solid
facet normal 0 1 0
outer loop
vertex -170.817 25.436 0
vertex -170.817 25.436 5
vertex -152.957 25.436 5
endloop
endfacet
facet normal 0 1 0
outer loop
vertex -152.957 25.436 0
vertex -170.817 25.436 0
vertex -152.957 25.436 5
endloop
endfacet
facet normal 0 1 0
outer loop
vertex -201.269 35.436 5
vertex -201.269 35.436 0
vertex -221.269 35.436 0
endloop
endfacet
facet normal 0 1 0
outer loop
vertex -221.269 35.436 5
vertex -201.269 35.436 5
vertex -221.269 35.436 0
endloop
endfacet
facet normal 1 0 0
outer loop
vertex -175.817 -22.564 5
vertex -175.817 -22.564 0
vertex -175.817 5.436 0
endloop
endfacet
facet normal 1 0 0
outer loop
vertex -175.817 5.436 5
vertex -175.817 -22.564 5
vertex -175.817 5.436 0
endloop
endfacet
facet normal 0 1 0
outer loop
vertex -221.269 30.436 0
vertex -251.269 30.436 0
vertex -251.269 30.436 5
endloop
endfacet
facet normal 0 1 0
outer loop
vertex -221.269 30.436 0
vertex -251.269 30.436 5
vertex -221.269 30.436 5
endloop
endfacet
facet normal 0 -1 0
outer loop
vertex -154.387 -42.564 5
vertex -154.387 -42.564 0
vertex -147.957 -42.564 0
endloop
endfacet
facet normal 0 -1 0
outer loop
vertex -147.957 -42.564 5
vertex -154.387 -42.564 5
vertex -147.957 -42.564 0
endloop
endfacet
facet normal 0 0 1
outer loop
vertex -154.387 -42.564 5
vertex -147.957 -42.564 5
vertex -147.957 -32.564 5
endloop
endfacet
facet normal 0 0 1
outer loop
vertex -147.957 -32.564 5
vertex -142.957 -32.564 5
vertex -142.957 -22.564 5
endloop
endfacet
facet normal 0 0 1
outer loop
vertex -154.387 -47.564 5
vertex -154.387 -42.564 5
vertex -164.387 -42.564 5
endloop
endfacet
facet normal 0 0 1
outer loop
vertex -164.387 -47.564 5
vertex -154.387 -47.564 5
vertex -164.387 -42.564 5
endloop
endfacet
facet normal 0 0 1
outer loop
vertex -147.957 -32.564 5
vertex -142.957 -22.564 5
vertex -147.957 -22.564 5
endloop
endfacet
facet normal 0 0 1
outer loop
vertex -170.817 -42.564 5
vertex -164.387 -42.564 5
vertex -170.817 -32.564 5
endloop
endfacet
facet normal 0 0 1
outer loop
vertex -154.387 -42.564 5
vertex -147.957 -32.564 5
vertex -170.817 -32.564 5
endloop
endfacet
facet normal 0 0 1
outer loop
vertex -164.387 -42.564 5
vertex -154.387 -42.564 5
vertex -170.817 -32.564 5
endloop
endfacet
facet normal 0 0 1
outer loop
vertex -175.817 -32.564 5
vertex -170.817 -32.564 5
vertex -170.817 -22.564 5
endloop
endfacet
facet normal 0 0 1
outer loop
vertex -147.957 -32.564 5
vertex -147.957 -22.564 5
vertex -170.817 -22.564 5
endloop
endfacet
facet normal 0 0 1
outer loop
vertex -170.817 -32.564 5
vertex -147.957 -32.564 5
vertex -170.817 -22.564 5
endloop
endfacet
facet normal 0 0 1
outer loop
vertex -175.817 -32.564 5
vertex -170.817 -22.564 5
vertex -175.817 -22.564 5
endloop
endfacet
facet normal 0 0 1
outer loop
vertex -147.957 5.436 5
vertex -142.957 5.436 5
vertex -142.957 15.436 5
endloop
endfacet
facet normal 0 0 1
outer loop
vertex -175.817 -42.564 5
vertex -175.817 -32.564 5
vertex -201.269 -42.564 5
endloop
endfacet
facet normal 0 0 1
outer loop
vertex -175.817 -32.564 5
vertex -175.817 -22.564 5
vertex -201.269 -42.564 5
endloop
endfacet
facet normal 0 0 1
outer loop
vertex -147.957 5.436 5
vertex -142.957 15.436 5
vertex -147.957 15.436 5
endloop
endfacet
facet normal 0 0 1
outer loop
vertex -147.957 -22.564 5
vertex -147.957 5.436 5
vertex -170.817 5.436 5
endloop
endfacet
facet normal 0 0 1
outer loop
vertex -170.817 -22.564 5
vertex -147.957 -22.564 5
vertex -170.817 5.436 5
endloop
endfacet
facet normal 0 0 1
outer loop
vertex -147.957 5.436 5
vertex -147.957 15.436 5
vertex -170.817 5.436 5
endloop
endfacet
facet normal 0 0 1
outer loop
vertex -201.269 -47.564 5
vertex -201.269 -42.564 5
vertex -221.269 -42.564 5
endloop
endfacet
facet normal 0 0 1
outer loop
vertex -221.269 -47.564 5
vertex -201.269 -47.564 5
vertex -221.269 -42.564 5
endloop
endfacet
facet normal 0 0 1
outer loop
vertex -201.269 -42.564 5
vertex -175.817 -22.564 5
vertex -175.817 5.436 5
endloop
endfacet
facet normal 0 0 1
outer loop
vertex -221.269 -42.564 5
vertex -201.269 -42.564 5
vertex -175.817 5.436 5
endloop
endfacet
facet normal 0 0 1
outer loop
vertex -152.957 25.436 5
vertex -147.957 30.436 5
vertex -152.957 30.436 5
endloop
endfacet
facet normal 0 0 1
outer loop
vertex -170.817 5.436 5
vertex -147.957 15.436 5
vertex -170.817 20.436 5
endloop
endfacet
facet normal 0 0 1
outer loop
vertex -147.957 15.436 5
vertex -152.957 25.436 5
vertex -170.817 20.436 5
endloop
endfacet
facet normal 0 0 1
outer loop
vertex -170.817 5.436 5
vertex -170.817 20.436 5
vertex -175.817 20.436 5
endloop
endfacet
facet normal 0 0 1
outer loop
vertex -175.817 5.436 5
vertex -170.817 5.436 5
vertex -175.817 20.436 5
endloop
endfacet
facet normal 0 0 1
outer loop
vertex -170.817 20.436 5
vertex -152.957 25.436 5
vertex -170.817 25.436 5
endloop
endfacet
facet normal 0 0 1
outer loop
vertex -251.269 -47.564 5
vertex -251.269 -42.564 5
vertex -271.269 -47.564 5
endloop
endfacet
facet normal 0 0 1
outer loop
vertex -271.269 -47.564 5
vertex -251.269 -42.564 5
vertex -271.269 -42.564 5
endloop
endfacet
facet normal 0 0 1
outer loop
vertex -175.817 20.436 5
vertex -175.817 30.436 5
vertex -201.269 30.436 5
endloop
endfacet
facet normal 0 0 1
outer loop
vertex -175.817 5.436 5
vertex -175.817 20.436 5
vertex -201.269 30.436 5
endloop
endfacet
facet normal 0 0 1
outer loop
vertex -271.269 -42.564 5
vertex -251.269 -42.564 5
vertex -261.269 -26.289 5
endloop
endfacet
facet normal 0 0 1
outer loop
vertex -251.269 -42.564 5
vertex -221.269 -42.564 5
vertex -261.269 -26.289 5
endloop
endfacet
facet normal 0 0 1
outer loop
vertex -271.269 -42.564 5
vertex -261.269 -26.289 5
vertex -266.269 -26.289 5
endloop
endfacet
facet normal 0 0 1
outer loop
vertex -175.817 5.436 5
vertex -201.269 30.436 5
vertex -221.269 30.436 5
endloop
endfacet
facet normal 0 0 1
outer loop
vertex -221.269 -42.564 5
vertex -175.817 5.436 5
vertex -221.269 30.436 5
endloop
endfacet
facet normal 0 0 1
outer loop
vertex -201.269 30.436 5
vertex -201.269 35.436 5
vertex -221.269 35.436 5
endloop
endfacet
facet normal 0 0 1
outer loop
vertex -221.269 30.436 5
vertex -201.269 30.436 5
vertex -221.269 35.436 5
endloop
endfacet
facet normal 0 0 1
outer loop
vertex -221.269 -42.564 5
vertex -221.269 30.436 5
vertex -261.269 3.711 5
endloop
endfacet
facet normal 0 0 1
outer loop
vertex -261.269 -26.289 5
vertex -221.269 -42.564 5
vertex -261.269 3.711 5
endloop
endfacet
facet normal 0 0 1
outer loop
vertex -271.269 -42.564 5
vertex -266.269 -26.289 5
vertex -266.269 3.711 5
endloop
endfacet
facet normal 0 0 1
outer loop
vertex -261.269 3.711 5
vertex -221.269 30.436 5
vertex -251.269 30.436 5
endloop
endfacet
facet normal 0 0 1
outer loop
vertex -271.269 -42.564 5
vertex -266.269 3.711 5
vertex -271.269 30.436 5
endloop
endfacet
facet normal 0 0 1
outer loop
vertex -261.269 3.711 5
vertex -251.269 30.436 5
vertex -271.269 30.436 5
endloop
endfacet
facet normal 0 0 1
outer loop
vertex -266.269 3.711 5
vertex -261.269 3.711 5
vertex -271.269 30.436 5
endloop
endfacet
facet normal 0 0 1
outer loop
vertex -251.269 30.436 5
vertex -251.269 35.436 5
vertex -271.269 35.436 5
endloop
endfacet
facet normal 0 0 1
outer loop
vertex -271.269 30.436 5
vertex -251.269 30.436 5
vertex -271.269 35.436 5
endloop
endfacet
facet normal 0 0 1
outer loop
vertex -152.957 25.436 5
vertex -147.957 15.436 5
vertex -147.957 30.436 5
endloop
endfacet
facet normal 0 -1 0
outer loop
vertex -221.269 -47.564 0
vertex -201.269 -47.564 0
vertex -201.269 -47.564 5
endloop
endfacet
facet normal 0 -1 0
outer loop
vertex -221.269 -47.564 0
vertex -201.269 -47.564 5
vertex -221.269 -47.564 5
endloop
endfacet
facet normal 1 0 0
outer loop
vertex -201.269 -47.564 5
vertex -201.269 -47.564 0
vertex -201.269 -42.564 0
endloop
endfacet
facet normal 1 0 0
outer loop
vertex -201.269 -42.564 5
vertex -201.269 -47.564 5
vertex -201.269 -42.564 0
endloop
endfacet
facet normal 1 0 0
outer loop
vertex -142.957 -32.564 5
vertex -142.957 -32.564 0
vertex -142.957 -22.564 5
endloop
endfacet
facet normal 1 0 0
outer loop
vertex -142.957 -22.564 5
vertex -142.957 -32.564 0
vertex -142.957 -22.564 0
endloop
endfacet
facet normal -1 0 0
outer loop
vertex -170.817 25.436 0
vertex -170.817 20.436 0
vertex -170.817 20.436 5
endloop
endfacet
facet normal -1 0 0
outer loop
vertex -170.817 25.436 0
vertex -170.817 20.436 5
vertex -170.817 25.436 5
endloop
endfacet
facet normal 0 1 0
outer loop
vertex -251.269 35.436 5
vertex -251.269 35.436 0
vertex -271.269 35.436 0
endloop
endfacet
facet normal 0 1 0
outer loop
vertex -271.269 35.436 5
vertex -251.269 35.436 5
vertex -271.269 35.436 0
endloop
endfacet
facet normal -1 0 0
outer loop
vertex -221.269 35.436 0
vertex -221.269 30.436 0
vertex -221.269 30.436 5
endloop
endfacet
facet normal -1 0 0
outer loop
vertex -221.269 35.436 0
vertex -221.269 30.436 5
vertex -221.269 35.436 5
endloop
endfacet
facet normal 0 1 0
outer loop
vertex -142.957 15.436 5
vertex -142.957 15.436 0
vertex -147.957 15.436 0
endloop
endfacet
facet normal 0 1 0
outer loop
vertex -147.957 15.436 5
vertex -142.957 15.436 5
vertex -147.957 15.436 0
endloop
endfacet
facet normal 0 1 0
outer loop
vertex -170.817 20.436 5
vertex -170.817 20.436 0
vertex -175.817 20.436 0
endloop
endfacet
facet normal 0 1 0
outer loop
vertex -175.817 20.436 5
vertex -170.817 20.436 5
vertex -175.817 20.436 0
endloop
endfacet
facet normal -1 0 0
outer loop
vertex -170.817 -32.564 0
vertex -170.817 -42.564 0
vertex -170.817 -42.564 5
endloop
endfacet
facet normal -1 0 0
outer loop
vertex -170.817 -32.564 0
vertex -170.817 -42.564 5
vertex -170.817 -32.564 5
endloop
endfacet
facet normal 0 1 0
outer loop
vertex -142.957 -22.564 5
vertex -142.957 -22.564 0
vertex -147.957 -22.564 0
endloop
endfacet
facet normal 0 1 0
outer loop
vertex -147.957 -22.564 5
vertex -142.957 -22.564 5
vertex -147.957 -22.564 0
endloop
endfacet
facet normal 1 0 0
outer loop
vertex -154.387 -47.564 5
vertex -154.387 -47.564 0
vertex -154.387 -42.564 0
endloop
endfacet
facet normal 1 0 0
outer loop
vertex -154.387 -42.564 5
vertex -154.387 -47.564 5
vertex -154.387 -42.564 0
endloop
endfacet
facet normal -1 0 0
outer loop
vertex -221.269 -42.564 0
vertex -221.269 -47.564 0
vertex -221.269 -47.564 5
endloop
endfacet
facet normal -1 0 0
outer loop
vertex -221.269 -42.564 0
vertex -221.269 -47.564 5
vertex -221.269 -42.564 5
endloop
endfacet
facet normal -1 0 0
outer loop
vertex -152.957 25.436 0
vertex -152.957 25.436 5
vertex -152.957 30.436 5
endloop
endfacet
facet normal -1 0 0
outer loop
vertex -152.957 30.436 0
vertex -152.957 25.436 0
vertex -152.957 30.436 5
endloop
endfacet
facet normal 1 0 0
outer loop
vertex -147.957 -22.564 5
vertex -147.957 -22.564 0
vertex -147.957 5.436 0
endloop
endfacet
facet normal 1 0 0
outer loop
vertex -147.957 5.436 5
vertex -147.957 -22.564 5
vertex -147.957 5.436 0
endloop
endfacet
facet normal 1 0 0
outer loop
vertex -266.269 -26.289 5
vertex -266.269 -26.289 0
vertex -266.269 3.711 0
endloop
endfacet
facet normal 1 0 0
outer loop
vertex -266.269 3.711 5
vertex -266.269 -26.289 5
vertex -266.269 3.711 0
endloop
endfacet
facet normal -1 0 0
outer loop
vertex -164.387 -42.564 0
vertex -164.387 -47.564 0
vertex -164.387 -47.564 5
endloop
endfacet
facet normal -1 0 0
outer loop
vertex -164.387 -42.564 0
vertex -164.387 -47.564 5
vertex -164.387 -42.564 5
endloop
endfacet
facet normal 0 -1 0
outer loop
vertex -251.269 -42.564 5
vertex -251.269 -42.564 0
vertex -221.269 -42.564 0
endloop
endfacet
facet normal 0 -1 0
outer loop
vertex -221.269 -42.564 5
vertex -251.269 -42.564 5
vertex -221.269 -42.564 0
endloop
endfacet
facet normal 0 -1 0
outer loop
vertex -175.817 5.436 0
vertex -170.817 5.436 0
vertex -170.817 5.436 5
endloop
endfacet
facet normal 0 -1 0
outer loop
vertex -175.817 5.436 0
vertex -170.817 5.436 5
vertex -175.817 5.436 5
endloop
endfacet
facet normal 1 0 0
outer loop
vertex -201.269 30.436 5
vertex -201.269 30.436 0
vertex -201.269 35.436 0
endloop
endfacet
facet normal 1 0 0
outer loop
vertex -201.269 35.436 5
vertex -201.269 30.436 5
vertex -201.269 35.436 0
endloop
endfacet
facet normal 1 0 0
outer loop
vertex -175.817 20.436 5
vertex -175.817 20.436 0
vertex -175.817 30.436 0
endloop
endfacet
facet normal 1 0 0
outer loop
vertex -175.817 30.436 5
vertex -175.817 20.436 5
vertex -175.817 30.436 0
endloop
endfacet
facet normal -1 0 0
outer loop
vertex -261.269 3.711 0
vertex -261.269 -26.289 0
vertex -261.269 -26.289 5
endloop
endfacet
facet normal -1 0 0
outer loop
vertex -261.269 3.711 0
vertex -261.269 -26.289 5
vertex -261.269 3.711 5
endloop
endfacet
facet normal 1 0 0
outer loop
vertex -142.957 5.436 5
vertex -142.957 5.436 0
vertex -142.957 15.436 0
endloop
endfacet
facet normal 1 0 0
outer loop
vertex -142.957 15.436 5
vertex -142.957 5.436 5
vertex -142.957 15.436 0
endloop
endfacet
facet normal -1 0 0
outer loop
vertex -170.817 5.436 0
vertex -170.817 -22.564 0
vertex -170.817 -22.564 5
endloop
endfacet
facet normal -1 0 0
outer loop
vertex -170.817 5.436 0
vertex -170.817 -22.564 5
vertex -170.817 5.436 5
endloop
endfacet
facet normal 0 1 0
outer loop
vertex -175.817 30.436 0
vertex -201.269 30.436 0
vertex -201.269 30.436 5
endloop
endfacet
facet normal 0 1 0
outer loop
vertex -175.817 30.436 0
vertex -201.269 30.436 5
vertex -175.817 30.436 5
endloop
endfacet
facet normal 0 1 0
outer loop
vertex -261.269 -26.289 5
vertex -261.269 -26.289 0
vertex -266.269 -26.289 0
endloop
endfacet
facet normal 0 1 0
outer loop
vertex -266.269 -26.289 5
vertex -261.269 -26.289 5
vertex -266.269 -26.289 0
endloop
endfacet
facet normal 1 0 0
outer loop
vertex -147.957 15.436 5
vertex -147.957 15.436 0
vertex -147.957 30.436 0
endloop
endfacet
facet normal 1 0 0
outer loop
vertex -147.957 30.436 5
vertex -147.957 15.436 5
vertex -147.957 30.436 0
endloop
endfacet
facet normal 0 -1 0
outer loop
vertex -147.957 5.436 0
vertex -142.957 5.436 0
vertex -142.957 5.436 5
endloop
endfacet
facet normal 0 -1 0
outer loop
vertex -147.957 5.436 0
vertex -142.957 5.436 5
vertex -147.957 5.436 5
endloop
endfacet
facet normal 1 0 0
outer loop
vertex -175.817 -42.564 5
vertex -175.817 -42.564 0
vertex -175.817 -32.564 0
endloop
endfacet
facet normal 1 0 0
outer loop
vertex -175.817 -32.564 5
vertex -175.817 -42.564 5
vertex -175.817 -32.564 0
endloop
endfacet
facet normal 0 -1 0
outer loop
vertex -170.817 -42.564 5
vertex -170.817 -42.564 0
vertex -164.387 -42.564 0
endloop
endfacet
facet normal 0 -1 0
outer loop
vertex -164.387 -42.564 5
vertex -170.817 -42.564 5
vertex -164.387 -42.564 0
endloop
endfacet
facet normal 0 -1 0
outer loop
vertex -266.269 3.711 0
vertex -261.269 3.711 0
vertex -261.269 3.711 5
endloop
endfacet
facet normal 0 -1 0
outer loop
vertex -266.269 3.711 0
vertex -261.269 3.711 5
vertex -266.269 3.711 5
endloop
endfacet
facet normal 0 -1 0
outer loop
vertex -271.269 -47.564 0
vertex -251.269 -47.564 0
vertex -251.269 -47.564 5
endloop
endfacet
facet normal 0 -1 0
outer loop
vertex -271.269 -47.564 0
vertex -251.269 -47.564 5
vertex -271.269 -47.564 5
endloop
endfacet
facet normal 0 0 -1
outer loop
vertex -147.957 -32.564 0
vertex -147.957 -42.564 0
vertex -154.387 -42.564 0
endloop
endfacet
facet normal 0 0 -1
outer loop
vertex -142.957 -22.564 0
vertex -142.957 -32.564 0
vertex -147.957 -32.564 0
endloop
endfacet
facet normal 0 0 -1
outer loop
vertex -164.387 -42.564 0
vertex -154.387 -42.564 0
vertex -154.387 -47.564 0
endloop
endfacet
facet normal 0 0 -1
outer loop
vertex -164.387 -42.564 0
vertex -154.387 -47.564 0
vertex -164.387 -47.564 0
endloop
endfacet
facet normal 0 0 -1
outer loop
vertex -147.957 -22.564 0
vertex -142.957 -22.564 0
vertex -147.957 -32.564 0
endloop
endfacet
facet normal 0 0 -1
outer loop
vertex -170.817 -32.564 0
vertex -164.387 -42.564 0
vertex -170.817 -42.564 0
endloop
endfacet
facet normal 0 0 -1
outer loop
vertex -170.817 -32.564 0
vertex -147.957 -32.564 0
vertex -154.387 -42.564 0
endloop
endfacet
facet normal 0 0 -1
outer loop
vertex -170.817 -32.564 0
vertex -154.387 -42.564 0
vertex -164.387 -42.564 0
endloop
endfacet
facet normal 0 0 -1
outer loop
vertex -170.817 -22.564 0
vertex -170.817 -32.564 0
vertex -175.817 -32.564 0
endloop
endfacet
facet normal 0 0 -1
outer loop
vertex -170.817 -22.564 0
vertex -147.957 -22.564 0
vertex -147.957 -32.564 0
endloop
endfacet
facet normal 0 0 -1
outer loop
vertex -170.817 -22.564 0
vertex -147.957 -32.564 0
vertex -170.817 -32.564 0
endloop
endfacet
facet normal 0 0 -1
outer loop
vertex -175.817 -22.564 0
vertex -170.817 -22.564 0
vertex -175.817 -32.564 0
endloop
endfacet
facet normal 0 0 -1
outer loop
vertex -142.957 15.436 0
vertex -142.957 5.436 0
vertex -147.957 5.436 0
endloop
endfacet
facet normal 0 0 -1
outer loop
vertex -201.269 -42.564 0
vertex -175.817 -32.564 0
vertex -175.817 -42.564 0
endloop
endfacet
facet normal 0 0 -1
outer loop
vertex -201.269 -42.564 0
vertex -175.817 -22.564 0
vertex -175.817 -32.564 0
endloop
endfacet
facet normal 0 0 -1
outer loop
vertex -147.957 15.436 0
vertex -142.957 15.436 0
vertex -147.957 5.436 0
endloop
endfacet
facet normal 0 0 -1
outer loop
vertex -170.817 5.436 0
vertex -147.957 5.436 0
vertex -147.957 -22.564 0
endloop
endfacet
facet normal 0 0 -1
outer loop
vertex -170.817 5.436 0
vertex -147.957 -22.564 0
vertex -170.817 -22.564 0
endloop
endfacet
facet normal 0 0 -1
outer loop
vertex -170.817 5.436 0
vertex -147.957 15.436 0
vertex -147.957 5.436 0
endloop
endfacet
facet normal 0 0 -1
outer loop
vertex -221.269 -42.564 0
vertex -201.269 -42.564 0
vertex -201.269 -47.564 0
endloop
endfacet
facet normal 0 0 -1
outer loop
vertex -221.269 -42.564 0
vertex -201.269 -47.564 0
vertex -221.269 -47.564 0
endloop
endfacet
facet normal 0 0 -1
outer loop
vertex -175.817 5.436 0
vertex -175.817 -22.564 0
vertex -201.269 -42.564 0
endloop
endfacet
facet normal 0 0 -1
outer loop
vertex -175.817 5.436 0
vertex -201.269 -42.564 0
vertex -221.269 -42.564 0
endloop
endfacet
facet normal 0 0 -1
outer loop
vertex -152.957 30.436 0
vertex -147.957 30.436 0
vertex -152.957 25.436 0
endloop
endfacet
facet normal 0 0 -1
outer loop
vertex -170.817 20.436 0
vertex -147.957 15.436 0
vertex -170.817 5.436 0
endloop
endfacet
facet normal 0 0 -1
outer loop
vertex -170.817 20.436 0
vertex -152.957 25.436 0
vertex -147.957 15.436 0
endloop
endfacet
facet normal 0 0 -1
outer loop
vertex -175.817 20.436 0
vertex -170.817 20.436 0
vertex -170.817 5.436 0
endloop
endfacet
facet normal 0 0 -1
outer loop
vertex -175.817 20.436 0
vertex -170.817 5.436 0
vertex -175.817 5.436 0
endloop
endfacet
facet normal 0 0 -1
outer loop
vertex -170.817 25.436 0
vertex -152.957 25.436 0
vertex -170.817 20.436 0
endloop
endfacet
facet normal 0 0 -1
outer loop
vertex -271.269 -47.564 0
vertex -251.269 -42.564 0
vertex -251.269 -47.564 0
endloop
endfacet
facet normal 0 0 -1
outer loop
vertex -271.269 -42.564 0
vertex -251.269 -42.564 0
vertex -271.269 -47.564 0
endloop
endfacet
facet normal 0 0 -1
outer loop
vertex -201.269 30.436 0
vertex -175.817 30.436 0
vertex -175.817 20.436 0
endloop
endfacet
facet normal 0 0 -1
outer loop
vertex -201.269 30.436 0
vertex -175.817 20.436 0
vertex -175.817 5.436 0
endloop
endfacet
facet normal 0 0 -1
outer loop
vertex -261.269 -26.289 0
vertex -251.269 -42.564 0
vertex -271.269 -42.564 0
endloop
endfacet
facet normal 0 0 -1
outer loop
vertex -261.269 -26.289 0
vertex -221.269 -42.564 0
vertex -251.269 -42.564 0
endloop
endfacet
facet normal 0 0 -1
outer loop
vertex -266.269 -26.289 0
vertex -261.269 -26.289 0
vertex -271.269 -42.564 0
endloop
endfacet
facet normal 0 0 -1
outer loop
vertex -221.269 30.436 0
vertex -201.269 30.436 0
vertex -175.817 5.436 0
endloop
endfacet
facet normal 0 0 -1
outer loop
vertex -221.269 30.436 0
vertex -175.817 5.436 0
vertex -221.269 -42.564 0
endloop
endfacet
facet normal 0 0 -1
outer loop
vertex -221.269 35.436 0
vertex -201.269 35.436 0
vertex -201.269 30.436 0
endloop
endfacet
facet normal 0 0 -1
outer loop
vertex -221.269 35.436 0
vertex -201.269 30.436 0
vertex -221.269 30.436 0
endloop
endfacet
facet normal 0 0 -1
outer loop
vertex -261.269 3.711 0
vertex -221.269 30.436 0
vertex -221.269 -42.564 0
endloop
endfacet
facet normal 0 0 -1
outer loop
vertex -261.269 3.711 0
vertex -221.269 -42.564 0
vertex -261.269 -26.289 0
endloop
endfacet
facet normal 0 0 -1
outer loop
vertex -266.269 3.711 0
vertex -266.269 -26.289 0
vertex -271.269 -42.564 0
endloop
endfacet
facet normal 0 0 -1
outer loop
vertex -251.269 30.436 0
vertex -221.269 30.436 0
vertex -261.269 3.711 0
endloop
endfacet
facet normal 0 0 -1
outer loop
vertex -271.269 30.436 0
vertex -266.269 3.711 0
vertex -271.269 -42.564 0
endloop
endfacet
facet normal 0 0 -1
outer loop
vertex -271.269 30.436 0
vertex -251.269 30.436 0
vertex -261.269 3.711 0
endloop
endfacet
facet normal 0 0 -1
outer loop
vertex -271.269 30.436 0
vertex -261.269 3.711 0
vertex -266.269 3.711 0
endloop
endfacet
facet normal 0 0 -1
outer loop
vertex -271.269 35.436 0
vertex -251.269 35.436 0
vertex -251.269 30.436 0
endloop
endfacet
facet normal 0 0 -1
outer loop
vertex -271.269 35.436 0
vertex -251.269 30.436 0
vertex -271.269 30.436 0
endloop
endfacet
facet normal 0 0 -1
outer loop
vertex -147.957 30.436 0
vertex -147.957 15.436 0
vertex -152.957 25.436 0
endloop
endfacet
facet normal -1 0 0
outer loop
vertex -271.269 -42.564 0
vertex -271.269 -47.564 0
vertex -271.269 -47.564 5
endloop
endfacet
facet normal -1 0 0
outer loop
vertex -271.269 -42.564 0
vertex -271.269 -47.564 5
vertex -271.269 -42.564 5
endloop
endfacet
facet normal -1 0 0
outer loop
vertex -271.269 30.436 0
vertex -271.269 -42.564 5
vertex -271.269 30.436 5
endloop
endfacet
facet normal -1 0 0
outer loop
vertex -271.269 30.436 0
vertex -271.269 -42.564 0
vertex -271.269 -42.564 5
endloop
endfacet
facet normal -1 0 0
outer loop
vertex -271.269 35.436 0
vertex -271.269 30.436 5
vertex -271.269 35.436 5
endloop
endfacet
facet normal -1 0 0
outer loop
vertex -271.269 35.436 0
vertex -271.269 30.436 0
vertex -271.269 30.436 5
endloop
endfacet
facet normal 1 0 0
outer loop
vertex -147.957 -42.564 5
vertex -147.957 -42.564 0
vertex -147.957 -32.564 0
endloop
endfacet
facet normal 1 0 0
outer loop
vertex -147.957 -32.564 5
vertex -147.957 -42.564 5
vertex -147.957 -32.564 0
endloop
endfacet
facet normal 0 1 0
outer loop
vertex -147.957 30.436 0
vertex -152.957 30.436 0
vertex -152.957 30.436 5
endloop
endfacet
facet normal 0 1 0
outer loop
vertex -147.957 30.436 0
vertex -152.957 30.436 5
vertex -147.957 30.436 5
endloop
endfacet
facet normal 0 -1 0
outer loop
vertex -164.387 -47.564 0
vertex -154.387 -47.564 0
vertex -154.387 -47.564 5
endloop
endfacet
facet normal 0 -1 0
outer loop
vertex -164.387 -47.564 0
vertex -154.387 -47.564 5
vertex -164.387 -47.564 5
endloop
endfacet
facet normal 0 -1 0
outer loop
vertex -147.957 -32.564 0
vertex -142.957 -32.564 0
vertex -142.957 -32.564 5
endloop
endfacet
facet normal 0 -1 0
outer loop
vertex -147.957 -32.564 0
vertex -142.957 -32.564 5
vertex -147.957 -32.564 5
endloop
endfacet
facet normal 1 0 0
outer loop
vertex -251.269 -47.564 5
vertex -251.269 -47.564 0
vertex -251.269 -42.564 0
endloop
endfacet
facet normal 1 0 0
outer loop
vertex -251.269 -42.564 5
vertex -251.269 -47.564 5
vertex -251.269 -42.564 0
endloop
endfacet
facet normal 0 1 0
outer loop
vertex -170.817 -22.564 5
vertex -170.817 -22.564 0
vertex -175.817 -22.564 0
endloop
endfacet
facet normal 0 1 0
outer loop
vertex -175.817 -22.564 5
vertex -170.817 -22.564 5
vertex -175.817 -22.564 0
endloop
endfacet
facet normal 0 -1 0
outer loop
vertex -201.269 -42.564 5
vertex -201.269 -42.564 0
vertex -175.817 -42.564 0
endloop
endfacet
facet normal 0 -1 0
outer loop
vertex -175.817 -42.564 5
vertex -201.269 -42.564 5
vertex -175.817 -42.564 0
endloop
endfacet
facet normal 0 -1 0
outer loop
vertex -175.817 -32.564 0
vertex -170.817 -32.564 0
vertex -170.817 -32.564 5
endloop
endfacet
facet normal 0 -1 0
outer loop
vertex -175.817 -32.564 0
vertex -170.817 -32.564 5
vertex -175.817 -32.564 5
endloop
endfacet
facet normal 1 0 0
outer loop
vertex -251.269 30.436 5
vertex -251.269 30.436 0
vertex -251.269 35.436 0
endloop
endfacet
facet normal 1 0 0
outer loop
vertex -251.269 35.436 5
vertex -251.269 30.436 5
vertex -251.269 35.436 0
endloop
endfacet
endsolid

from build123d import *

# Parameters (mm, degrees)
ESQUISSE1_W             = 128.311788567
ESQUISSE1_H             = 73
BOSS_EXTRU_1_DEPTH      = 5
ESQUISSE3_W             = 5
ESQUISSE3_H             = 10
ESQUISSE3_H_2           = 28
ESQUISSE3_H_3           = 15
ESQUISSE3_H_4           = 30
ENL_V_MAT_EXTRU_1_DEPTH = 5
ESQUISSE4_W             = 17.86
ESQUISSE4_H             = 5
ENL_V_MAT_EXTRU_2_DEPTH = 5
ESQUISSE5_W             = 20
ESQUISSE5_H             = 5
ESQUISSE5_W_2           = 10
BOSS_EXTRU_2_DEPTH      = 5


with BuildPart() as part:
    # Esquisse1 → Boss.-Extru.1 (new body)
    with BuildSketch(Plane.XY):
        with Locations((-207.112987496, -6.063856407)):
            Rectangle(ESQUISSE1_W, ESQUISSE1_H)
    extrude(amount=BOSS_EXTRU_1_DEPTH)

    # Esquisse3 → Enlèv. mat.-Extru.1 (cut)
    with BuildSketch(Plane(origin=(0, 0, 0), x_dir=(-1, 0, 0), z_dir=(0, 0, -1))):
        with Locations((173.317093212, 25.436143593)):
            Rectangle(ESQUISSE3_W, ESQUISSE3_H)
        with Locations((173.317093212, -8.563856407)):
            Rectangle(ESQUISSE3_W, ESQUISSE3_H_2)
        with Locations((173.317093212, -37.563856407)):
            Rectangle(ESQUISSE3_W, ESQUISSE3_H)
        with Locations((145.457093212, 22.936143593)):
            Rectangle(ESQUISSE3_W, ESQUISSE3_H_3)
        with Locations((145.457093212, -8.563856407)):
            Rectangle(ESQUISSE3_W, ESQUISSE3_H_2)
        with Locations((145.457093212, -37.563856407)):
            Rectangle(ESQUISSE3_W, ESQUISSE3_H)
        with Locations((263.768881779, -11.288856407)):
            Rectangle(ESQUISSE3_W, ESQUISSE3_H_4)
    extrude(amount=-ENL_V_MAT_EXTRU_1_DEPTH, mode=Mode.SUBTRACT)

    # Esquisse4 → Enlèv. mat.-Extru.2 (cut)
    with BuildSketch(Plane.XY.offset(5)):
        with Locations((-161.887093212, 27.936143593)):
            Rectangle(ESQUISSE4_W, ESQUISSE4_H)
    extrude(amount=-ENL_V_MAT_EXTRU_2_DEPTH, mode=Mode.SUBTRACT)

    # Esquisse5 → Boss.-Extru.2 (add)
    with BuildSketch(Plane(origin=(0, 0, 0), x_dir=(-1, 0, 0), z_dir=(0, 0, -1))):
        with Locations((211.268881779, 32.936143593)):
            Rectangle(ESQUISSE5_W, ESQUISSE5_H)
        with Locations((261.268881779, 32.936143593)):
            Rectangle(ESQUISSE5_W, ESQUISSE5_H)
        with Locations((261.268881779, -45.063856407)):
            Rectangle(ESQUISSE5_W, ESQUISSE5_H)
        with Locations((211.268881779, -45.063856407)):
            Rectangle(ESQUISSE5_W, ESQUISSE5_H)
        with Locations((159.387093212, -45.063856407)):
            Rectangle(ESQUISSE5_W_2, ESQUISSE5_H)
    extrude(amount=-BOSS_EXTRU_2_DEPTH)


solid = part.part
